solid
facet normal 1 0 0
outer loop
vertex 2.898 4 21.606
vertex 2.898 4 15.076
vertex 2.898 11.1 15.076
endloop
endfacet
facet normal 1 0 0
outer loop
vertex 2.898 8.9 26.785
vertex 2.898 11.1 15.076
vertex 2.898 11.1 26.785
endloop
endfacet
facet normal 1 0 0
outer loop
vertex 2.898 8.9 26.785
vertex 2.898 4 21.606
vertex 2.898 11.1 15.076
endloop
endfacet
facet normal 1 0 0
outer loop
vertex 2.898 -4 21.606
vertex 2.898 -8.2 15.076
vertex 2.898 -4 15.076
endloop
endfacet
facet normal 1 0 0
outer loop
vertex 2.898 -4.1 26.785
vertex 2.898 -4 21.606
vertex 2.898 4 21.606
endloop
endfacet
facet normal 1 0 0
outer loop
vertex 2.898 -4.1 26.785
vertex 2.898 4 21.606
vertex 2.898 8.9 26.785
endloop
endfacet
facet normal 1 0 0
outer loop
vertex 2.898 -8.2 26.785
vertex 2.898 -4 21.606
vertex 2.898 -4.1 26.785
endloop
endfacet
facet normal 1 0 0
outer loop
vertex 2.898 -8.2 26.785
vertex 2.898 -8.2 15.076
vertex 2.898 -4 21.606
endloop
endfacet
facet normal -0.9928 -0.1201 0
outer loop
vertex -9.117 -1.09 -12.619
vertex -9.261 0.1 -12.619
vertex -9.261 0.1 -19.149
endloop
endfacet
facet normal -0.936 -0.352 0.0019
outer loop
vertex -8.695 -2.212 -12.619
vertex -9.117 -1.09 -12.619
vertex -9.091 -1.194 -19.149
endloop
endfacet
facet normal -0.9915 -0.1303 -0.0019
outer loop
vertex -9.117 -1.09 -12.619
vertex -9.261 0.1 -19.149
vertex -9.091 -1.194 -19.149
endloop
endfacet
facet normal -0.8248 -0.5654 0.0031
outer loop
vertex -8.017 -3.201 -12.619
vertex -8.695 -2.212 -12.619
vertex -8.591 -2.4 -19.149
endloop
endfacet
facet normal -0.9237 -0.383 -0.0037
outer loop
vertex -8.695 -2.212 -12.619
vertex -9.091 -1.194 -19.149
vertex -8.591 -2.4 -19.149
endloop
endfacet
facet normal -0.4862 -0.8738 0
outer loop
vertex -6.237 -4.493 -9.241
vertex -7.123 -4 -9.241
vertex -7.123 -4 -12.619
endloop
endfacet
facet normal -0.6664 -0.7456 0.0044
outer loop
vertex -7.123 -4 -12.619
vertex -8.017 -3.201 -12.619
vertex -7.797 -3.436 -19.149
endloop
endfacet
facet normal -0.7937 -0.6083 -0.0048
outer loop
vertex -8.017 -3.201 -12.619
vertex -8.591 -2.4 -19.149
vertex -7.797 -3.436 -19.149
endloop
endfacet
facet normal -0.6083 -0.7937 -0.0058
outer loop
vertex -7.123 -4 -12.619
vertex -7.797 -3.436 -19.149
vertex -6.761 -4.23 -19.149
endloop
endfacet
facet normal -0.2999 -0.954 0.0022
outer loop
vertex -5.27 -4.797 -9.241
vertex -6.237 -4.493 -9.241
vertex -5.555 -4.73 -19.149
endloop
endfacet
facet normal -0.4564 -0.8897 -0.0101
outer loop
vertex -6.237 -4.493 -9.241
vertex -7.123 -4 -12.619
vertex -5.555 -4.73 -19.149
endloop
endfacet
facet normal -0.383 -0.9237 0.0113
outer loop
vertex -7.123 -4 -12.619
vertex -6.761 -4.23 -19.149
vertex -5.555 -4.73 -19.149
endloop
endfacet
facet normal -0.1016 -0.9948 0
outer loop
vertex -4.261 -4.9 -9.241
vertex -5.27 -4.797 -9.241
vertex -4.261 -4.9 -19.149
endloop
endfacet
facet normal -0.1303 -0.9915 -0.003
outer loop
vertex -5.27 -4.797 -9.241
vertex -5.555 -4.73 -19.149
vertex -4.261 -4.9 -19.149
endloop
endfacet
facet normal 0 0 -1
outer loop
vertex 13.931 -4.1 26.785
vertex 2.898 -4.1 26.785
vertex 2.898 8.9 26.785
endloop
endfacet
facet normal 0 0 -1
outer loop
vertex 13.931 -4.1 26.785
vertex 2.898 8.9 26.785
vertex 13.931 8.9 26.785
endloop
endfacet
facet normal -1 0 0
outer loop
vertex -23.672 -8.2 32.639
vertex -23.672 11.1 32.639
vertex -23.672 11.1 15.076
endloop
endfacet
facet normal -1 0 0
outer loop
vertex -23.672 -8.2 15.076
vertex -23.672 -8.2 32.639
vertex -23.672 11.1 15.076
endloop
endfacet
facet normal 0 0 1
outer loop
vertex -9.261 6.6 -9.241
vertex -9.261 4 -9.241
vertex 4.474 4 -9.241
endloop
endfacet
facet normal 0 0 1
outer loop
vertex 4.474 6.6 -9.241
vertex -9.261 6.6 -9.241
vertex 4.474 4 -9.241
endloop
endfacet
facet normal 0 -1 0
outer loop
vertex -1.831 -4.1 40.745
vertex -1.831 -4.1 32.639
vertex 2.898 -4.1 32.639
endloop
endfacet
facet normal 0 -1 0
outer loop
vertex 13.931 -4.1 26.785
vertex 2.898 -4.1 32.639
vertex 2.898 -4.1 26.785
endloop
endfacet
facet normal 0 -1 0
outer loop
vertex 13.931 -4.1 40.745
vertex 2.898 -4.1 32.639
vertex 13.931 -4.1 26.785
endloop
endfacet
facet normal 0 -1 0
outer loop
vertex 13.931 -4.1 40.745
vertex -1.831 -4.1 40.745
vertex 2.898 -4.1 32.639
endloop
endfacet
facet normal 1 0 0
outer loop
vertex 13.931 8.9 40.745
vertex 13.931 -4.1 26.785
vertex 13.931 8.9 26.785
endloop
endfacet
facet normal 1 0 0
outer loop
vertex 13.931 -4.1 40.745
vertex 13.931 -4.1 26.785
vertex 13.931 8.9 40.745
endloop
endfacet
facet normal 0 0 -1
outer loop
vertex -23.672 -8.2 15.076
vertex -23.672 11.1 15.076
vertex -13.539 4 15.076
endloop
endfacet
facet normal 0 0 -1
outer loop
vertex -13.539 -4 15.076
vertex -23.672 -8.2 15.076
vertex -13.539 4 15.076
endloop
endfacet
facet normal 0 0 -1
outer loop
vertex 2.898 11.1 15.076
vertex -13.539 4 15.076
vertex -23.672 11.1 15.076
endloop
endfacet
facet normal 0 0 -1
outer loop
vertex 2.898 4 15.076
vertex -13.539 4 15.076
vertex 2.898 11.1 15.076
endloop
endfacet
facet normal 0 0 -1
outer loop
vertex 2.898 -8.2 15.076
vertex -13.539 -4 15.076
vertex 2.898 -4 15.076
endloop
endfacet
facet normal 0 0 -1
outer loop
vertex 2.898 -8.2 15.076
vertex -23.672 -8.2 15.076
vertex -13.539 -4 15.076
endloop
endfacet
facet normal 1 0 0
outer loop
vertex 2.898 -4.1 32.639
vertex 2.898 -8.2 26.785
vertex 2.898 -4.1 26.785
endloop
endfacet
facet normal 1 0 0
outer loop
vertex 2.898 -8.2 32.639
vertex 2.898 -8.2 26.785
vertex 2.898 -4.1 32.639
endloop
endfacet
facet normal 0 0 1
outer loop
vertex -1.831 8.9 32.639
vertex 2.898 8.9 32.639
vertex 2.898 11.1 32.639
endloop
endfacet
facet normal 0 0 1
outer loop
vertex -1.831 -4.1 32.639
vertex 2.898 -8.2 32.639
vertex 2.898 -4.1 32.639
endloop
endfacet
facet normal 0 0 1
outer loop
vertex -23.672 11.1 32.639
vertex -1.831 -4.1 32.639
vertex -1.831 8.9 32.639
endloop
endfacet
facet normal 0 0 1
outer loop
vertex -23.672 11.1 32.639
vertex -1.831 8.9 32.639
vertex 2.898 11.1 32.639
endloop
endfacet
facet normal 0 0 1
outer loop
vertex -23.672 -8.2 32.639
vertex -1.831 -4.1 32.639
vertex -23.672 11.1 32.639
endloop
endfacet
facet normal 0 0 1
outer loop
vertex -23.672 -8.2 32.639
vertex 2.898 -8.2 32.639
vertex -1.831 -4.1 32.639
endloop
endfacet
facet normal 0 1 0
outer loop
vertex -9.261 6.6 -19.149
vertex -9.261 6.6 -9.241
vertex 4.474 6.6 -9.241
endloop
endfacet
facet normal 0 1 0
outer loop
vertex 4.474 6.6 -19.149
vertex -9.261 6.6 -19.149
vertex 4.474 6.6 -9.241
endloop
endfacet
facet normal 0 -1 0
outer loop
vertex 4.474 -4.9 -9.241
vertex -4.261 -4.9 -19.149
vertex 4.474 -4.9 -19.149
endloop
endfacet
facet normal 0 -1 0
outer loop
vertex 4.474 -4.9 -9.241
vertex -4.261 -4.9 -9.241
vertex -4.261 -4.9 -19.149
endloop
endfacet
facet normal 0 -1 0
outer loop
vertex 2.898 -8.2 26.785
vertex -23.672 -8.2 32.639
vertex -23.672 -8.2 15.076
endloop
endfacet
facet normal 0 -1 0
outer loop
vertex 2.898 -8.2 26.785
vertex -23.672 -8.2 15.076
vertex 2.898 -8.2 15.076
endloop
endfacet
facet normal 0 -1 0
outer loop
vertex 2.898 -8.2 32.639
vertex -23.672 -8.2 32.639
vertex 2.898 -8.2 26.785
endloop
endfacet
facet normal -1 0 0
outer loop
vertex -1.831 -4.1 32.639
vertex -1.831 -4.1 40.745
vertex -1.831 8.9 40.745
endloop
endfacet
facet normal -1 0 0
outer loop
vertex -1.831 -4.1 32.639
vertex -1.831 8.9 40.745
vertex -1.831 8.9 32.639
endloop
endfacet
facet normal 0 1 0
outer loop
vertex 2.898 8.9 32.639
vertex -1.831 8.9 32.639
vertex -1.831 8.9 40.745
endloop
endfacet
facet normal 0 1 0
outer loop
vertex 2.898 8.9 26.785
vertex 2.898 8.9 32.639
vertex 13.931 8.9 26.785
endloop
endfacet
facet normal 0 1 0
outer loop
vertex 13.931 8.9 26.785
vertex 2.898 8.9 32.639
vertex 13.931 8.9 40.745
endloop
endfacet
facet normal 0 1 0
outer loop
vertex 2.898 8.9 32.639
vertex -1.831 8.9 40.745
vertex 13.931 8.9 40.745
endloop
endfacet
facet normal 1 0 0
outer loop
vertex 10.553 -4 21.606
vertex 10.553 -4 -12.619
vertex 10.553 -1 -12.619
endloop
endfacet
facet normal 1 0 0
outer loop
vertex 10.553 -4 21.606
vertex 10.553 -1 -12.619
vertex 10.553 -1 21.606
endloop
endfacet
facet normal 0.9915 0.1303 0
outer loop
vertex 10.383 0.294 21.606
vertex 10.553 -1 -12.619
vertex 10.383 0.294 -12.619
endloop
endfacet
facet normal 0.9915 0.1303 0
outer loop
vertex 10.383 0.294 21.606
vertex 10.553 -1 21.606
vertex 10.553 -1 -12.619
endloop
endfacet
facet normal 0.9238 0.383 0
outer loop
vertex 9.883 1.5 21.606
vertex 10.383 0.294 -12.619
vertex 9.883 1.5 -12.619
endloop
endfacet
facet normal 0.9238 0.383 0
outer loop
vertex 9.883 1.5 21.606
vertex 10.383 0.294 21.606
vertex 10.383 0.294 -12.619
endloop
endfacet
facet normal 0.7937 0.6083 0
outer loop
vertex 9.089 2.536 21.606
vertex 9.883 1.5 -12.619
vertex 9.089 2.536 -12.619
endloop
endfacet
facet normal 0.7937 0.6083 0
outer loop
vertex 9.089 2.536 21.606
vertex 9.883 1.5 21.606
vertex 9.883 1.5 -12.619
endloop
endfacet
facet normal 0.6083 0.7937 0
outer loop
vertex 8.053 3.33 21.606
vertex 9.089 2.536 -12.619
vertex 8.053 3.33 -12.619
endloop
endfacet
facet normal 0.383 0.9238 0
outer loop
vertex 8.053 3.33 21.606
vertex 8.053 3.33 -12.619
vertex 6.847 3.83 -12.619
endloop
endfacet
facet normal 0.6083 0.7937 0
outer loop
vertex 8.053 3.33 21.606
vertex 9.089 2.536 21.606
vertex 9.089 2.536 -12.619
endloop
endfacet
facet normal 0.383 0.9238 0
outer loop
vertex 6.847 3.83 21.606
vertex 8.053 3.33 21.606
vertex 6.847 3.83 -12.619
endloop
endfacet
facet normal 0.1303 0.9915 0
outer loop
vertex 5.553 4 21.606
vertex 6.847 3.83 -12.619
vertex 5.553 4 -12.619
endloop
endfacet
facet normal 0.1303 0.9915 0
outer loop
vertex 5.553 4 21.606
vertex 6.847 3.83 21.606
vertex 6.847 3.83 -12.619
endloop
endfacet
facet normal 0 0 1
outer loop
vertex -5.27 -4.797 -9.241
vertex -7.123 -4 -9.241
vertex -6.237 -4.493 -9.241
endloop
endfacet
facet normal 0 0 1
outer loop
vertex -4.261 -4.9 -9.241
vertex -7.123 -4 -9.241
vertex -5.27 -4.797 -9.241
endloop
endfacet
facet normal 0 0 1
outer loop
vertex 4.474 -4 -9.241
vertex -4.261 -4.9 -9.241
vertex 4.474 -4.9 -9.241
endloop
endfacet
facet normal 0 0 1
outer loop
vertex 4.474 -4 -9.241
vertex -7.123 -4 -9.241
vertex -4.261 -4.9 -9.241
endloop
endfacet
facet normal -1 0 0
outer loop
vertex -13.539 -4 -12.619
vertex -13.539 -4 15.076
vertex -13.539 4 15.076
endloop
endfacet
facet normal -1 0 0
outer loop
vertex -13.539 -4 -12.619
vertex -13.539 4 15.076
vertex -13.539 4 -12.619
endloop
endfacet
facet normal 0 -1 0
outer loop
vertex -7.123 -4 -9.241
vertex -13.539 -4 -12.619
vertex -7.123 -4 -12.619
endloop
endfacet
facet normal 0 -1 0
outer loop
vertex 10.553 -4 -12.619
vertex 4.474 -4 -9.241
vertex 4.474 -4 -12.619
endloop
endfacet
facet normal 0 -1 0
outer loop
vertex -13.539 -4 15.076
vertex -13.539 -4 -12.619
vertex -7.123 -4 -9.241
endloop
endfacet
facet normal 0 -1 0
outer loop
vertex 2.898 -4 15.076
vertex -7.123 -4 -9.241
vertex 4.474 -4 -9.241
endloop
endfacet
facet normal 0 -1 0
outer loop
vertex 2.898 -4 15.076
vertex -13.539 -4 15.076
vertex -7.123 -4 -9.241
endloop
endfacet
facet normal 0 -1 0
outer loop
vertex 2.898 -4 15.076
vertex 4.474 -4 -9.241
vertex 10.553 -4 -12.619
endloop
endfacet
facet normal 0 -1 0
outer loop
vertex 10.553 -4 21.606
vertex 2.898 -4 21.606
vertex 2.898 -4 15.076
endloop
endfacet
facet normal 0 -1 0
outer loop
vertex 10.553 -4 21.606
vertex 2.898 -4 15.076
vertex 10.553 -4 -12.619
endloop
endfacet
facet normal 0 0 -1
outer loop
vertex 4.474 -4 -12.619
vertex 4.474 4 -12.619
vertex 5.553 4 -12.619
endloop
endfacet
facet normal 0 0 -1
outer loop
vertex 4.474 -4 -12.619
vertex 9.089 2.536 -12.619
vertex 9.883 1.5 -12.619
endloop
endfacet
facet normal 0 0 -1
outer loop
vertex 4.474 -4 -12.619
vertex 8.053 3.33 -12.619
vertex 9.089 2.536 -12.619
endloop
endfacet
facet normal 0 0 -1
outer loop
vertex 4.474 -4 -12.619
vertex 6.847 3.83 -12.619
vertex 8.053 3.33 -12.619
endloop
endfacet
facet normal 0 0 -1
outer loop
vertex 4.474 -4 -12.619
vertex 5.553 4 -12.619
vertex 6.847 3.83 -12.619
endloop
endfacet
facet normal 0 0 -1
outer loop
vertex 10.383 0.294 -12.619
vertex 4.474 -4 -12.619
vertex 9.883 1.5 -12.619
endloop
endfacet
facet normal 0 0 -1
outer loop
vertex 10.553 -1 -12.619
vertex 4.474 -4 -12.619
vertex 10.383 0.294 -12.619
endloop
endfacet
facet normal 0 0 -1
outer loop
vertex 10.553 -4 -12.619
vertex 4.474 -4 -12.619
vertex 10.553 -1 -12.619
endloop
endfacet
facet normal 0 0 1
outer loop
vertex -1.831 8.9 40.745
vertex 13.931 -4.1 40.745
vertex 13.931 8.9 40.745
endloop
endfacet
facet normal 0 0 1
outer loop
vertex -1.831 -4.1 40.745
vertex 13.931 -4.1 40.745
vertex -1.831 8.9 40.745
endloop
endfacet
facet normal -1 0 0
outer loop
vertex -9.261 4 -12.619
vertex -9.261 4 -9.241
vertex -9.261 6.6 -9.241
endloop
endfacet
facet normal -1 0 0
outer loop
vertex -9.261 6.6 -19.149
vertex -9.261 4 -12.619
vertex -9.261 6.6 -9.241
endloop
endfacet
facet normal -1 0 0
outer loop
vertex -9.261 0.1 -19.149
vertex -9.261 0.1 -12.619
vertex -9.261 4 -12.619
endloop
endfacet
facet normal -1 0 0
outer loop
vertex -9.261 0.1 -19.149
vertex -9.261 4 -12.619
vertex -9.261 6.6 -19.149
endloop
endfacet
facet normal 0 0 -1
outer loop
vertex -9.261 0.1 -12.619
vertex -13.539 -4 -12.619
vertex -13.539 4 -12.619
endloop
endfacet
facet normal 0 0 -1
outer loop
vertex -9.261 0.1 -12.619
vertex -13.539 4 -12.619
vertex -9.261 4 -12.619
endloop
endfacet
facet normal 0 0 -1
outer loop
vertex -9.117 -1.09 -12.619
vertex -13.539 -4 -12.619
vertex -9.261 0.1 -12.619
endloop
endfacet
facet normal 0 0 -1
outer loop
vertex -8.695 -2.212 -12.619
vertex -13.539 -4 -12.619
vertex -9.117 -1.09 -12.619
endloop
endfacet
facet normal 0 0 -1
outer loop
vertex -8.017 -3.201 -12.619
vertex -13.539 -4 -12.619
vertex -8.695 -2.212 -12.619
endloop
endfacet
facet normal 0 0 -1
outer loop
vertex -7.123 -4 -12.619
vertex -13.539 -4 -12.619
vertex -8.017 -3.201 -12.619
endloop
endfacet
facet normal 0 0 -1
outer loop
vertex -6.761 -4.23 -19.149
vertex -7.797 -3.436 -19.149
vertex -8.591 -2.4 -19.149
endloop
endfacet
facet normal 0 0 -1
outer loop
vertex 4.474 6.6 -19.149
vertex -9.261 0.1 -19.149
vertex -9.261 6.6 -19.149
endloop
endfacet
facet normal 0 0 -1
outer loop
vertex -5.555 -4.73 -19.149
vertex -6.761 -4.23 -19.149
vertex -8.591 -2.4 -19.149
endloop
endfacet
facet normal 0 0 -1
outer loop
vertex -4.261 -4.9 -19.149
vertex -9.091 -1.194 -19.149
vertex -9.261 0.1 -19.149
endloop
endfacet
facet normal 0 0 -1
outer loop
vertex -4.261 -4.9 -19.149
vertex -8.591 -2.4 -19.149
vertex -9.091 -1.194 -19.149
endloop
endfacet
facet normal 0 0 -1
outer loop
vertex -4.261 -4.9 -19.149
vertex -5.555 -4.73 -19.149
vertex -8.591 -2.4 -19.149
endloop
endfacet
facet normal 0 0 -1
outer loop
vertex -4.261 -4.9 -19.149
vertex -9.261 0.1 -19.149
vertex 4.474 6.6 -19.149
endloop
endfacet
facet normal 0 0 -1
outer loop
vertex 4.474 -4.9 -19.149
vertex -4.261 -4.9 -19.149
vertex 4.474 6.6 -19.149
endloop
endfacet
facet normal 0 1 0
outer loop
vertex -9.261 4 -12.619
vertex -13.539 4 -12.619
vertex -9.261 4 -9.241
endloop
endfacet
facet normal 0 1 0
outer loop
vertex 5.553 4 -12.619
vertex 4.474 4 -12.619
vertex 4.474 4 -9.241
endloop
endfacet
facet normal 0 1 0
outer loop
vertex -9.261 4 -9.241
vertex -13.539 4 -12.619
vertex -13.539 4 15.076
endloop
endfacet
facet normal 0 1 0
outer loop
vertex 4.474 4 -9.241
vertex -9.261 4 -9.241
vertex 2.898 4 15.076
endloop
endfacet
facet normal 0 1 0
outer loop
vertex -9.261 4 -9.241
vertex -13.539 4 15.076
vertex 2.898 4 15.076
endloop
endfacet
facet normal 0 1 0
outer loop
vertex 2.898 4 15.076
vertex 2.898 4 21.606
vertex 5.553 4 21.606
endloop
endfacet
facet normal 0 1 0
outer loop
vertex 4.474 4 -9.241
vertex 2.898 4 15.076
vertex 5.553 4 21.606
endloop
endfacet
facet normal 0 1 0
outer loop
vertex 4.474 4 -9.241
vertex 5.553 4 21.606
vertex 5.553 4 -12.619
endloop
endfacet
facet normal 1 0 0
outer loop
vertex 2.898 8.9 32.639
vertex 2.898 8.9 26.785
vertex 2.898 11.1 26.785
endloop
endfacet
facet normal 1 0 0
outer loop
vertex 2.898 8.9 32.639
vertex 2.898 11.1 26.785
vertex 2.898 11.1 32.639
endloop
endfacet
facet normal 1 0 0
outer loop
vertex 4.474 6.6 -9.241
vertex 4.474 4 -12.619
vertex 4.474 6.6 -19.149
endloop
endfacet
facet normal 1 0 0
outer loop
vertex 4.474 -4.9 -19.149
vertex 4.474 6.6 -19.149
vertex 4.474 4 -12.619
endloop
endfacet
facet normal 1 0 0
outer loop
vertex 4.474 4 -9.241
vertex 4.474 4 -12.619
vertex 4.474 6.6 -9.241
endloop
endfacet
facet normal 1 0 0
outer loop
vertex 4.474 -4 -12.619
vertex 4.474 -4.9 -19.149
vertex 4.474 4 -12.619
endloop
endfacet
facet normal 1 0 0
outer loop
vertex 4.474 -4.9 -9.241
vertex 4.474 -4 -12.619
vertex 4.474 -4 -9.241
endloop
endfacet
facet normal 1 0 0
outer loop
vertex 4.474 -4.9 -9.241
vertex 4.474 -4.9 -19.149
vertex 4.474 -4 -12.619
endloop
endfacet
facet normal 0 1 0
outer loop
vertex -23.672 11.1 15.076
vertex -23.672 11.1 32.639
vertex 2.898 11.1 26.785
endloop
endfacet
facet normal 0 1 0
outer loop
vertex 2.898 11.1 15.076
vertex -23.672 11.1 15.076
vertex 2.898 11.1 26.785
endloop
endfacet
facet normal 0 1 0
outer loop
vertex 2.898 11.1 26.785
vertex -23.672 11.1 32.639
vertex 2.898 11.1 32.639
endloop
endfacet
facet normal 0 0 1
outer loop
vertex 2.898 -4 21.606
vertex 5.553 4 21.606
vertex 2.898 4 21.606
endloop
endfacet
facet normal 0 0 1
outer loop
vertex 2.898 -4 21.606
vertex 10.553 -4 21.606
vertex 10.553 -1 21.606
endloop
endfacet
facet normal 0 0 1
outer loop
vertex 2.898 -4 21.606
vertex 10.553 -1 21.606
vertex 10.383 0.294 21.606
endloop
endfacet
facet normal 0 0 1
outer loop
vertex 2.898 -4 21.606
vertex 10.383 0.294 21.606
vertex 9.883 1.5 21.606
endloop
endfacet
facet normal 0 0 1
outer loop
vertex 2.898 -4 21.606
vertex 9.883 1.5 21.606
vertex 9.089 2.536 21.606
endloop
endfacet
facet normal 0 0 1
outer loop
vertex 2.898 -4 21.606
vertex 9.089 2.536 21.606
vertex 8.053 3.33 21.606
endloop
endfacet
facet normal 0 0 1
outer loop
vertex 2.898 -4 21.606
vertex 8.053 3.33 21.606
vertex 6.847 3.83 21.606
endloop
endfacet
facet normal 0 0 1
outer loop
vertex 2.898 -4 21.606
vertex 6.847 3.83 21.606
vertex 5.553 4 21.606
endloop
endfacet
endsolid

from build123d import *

# Parameters (mm, degrees)
F1_DEPTH      = 4
F1_DEPTH_BACK = 4
F0_W          = 16.4369798731
F0_H          = 6.529757753
F0_W_2        = 4.7284475295
F0_H_2        = 5.8542657644
F2_DEPTH      = 8.2
F2_DEPTH_BACK = 11.1
F3_DEPTH      = 4.1
F3_DEPTH_BACK = 8.9
F0_W_3        = 13.7350079603
F0_H_3        = 3.3774608746
F4_DEPTH      = 4.9
F4_DEPTH_BACK = 6.6
F5_R          = 5


with BuildPart() as f1:
    # F0 (on Front) → F1 (new body, two sides)
    with BuildSketch(Plane.XZ) as f1_sk:
        Polygon((10.553249158, 21.6060578823), (2.897671191, 21.6060578823), (2.897671191, 15.0763001293), (-13.5393086821, 15.0763001293), (-13.5393086821, -12.6188807189), (-9.2611899599, -12.6188807189), (-9.2611899599, -9.2414198443), (4.4738180004, -9.2414198443), (4.4738180004, -12.6188807189), (10.553249158, -12.6188807189), align=None)
    extrude(amount=F1_DEPTH)
    extrude(f1_sk.sketch, amount=-F1_DEPTH_BACK)

    # F0 (on Front) → F2 (join, two sides)
    with BuildSketch(Plane.XZ) as f2_sk:
        with Locations((-5.3208187455, 18.3411790058)):
            Rectangle(F0_W, F0_H)
        Polygon((-13.5393086821, 15.0763001293), (-13.5393086821, 21.6060578823), (2.897671191, 21.6060578823), (2.897671191, 26.784831658), (-1.8307763385, 26.784831658), (-1.8307763385, 32.6390974224), (-23.6716903746, 32.6390974224), (-23.6716903746, 15.0763001293), align=None)
        with Locations((0.5334474263, 29.7119645402)):
            Rectangle(F0_W_2, F0_H_2)
    extrude(amount=F2_DEPTH)
    extrude(f2_sk.sketch, amount=-F2_DEPTH_BACK)

    # F0 (on Front) → F3 (join, two sides)
    with BuildSketch(Plane.XZ) as f3_sk:
        Polygon((2.897671191, 32.6390974224), (2.897671191, 26.784831658), (13.9307100326, 26.784831658), (13.9307100326, 40.7450050116), (-1.8307763385, 40.7450050116), (-1.8307763385, 32.6390974224), align=None)
        with Locations((0.5334474263, 29.7119645402)):
            Rectangle(F0_W_2, F0_H_2)
    extrude(amount=F3_DEPTH)
    extrude(f3_sk.sketch, amount=-F3_DEPTH_BACK)

    # F0 (on Front) → F4 (join, two sides)
    with BuildSketch(Plane.XZ) as f4_sk:
        with Locations((-2.3936859798, -10.9301502816)):
            Rectangle(F0_W_3, F0_H_3)
        with Locations((-2.3936859798, -15.8837595955)):
            Rectangle(F0_W_3, F0_H)
    extrude(amount=F4_DEPTH)
    extrude(f4_sk.sketch, amount=-F4_DEPTH_BACK)

    # F5
    f5_edges = [f1.edges().sort_by_distance(p)[0] for p in [
        (10.553249, 4, 4.493589),
        (-9.26119, -4.9, -14.195029),
    ]]
    fillet(f5_edges, radius=F5_R)


solid = f1.part
